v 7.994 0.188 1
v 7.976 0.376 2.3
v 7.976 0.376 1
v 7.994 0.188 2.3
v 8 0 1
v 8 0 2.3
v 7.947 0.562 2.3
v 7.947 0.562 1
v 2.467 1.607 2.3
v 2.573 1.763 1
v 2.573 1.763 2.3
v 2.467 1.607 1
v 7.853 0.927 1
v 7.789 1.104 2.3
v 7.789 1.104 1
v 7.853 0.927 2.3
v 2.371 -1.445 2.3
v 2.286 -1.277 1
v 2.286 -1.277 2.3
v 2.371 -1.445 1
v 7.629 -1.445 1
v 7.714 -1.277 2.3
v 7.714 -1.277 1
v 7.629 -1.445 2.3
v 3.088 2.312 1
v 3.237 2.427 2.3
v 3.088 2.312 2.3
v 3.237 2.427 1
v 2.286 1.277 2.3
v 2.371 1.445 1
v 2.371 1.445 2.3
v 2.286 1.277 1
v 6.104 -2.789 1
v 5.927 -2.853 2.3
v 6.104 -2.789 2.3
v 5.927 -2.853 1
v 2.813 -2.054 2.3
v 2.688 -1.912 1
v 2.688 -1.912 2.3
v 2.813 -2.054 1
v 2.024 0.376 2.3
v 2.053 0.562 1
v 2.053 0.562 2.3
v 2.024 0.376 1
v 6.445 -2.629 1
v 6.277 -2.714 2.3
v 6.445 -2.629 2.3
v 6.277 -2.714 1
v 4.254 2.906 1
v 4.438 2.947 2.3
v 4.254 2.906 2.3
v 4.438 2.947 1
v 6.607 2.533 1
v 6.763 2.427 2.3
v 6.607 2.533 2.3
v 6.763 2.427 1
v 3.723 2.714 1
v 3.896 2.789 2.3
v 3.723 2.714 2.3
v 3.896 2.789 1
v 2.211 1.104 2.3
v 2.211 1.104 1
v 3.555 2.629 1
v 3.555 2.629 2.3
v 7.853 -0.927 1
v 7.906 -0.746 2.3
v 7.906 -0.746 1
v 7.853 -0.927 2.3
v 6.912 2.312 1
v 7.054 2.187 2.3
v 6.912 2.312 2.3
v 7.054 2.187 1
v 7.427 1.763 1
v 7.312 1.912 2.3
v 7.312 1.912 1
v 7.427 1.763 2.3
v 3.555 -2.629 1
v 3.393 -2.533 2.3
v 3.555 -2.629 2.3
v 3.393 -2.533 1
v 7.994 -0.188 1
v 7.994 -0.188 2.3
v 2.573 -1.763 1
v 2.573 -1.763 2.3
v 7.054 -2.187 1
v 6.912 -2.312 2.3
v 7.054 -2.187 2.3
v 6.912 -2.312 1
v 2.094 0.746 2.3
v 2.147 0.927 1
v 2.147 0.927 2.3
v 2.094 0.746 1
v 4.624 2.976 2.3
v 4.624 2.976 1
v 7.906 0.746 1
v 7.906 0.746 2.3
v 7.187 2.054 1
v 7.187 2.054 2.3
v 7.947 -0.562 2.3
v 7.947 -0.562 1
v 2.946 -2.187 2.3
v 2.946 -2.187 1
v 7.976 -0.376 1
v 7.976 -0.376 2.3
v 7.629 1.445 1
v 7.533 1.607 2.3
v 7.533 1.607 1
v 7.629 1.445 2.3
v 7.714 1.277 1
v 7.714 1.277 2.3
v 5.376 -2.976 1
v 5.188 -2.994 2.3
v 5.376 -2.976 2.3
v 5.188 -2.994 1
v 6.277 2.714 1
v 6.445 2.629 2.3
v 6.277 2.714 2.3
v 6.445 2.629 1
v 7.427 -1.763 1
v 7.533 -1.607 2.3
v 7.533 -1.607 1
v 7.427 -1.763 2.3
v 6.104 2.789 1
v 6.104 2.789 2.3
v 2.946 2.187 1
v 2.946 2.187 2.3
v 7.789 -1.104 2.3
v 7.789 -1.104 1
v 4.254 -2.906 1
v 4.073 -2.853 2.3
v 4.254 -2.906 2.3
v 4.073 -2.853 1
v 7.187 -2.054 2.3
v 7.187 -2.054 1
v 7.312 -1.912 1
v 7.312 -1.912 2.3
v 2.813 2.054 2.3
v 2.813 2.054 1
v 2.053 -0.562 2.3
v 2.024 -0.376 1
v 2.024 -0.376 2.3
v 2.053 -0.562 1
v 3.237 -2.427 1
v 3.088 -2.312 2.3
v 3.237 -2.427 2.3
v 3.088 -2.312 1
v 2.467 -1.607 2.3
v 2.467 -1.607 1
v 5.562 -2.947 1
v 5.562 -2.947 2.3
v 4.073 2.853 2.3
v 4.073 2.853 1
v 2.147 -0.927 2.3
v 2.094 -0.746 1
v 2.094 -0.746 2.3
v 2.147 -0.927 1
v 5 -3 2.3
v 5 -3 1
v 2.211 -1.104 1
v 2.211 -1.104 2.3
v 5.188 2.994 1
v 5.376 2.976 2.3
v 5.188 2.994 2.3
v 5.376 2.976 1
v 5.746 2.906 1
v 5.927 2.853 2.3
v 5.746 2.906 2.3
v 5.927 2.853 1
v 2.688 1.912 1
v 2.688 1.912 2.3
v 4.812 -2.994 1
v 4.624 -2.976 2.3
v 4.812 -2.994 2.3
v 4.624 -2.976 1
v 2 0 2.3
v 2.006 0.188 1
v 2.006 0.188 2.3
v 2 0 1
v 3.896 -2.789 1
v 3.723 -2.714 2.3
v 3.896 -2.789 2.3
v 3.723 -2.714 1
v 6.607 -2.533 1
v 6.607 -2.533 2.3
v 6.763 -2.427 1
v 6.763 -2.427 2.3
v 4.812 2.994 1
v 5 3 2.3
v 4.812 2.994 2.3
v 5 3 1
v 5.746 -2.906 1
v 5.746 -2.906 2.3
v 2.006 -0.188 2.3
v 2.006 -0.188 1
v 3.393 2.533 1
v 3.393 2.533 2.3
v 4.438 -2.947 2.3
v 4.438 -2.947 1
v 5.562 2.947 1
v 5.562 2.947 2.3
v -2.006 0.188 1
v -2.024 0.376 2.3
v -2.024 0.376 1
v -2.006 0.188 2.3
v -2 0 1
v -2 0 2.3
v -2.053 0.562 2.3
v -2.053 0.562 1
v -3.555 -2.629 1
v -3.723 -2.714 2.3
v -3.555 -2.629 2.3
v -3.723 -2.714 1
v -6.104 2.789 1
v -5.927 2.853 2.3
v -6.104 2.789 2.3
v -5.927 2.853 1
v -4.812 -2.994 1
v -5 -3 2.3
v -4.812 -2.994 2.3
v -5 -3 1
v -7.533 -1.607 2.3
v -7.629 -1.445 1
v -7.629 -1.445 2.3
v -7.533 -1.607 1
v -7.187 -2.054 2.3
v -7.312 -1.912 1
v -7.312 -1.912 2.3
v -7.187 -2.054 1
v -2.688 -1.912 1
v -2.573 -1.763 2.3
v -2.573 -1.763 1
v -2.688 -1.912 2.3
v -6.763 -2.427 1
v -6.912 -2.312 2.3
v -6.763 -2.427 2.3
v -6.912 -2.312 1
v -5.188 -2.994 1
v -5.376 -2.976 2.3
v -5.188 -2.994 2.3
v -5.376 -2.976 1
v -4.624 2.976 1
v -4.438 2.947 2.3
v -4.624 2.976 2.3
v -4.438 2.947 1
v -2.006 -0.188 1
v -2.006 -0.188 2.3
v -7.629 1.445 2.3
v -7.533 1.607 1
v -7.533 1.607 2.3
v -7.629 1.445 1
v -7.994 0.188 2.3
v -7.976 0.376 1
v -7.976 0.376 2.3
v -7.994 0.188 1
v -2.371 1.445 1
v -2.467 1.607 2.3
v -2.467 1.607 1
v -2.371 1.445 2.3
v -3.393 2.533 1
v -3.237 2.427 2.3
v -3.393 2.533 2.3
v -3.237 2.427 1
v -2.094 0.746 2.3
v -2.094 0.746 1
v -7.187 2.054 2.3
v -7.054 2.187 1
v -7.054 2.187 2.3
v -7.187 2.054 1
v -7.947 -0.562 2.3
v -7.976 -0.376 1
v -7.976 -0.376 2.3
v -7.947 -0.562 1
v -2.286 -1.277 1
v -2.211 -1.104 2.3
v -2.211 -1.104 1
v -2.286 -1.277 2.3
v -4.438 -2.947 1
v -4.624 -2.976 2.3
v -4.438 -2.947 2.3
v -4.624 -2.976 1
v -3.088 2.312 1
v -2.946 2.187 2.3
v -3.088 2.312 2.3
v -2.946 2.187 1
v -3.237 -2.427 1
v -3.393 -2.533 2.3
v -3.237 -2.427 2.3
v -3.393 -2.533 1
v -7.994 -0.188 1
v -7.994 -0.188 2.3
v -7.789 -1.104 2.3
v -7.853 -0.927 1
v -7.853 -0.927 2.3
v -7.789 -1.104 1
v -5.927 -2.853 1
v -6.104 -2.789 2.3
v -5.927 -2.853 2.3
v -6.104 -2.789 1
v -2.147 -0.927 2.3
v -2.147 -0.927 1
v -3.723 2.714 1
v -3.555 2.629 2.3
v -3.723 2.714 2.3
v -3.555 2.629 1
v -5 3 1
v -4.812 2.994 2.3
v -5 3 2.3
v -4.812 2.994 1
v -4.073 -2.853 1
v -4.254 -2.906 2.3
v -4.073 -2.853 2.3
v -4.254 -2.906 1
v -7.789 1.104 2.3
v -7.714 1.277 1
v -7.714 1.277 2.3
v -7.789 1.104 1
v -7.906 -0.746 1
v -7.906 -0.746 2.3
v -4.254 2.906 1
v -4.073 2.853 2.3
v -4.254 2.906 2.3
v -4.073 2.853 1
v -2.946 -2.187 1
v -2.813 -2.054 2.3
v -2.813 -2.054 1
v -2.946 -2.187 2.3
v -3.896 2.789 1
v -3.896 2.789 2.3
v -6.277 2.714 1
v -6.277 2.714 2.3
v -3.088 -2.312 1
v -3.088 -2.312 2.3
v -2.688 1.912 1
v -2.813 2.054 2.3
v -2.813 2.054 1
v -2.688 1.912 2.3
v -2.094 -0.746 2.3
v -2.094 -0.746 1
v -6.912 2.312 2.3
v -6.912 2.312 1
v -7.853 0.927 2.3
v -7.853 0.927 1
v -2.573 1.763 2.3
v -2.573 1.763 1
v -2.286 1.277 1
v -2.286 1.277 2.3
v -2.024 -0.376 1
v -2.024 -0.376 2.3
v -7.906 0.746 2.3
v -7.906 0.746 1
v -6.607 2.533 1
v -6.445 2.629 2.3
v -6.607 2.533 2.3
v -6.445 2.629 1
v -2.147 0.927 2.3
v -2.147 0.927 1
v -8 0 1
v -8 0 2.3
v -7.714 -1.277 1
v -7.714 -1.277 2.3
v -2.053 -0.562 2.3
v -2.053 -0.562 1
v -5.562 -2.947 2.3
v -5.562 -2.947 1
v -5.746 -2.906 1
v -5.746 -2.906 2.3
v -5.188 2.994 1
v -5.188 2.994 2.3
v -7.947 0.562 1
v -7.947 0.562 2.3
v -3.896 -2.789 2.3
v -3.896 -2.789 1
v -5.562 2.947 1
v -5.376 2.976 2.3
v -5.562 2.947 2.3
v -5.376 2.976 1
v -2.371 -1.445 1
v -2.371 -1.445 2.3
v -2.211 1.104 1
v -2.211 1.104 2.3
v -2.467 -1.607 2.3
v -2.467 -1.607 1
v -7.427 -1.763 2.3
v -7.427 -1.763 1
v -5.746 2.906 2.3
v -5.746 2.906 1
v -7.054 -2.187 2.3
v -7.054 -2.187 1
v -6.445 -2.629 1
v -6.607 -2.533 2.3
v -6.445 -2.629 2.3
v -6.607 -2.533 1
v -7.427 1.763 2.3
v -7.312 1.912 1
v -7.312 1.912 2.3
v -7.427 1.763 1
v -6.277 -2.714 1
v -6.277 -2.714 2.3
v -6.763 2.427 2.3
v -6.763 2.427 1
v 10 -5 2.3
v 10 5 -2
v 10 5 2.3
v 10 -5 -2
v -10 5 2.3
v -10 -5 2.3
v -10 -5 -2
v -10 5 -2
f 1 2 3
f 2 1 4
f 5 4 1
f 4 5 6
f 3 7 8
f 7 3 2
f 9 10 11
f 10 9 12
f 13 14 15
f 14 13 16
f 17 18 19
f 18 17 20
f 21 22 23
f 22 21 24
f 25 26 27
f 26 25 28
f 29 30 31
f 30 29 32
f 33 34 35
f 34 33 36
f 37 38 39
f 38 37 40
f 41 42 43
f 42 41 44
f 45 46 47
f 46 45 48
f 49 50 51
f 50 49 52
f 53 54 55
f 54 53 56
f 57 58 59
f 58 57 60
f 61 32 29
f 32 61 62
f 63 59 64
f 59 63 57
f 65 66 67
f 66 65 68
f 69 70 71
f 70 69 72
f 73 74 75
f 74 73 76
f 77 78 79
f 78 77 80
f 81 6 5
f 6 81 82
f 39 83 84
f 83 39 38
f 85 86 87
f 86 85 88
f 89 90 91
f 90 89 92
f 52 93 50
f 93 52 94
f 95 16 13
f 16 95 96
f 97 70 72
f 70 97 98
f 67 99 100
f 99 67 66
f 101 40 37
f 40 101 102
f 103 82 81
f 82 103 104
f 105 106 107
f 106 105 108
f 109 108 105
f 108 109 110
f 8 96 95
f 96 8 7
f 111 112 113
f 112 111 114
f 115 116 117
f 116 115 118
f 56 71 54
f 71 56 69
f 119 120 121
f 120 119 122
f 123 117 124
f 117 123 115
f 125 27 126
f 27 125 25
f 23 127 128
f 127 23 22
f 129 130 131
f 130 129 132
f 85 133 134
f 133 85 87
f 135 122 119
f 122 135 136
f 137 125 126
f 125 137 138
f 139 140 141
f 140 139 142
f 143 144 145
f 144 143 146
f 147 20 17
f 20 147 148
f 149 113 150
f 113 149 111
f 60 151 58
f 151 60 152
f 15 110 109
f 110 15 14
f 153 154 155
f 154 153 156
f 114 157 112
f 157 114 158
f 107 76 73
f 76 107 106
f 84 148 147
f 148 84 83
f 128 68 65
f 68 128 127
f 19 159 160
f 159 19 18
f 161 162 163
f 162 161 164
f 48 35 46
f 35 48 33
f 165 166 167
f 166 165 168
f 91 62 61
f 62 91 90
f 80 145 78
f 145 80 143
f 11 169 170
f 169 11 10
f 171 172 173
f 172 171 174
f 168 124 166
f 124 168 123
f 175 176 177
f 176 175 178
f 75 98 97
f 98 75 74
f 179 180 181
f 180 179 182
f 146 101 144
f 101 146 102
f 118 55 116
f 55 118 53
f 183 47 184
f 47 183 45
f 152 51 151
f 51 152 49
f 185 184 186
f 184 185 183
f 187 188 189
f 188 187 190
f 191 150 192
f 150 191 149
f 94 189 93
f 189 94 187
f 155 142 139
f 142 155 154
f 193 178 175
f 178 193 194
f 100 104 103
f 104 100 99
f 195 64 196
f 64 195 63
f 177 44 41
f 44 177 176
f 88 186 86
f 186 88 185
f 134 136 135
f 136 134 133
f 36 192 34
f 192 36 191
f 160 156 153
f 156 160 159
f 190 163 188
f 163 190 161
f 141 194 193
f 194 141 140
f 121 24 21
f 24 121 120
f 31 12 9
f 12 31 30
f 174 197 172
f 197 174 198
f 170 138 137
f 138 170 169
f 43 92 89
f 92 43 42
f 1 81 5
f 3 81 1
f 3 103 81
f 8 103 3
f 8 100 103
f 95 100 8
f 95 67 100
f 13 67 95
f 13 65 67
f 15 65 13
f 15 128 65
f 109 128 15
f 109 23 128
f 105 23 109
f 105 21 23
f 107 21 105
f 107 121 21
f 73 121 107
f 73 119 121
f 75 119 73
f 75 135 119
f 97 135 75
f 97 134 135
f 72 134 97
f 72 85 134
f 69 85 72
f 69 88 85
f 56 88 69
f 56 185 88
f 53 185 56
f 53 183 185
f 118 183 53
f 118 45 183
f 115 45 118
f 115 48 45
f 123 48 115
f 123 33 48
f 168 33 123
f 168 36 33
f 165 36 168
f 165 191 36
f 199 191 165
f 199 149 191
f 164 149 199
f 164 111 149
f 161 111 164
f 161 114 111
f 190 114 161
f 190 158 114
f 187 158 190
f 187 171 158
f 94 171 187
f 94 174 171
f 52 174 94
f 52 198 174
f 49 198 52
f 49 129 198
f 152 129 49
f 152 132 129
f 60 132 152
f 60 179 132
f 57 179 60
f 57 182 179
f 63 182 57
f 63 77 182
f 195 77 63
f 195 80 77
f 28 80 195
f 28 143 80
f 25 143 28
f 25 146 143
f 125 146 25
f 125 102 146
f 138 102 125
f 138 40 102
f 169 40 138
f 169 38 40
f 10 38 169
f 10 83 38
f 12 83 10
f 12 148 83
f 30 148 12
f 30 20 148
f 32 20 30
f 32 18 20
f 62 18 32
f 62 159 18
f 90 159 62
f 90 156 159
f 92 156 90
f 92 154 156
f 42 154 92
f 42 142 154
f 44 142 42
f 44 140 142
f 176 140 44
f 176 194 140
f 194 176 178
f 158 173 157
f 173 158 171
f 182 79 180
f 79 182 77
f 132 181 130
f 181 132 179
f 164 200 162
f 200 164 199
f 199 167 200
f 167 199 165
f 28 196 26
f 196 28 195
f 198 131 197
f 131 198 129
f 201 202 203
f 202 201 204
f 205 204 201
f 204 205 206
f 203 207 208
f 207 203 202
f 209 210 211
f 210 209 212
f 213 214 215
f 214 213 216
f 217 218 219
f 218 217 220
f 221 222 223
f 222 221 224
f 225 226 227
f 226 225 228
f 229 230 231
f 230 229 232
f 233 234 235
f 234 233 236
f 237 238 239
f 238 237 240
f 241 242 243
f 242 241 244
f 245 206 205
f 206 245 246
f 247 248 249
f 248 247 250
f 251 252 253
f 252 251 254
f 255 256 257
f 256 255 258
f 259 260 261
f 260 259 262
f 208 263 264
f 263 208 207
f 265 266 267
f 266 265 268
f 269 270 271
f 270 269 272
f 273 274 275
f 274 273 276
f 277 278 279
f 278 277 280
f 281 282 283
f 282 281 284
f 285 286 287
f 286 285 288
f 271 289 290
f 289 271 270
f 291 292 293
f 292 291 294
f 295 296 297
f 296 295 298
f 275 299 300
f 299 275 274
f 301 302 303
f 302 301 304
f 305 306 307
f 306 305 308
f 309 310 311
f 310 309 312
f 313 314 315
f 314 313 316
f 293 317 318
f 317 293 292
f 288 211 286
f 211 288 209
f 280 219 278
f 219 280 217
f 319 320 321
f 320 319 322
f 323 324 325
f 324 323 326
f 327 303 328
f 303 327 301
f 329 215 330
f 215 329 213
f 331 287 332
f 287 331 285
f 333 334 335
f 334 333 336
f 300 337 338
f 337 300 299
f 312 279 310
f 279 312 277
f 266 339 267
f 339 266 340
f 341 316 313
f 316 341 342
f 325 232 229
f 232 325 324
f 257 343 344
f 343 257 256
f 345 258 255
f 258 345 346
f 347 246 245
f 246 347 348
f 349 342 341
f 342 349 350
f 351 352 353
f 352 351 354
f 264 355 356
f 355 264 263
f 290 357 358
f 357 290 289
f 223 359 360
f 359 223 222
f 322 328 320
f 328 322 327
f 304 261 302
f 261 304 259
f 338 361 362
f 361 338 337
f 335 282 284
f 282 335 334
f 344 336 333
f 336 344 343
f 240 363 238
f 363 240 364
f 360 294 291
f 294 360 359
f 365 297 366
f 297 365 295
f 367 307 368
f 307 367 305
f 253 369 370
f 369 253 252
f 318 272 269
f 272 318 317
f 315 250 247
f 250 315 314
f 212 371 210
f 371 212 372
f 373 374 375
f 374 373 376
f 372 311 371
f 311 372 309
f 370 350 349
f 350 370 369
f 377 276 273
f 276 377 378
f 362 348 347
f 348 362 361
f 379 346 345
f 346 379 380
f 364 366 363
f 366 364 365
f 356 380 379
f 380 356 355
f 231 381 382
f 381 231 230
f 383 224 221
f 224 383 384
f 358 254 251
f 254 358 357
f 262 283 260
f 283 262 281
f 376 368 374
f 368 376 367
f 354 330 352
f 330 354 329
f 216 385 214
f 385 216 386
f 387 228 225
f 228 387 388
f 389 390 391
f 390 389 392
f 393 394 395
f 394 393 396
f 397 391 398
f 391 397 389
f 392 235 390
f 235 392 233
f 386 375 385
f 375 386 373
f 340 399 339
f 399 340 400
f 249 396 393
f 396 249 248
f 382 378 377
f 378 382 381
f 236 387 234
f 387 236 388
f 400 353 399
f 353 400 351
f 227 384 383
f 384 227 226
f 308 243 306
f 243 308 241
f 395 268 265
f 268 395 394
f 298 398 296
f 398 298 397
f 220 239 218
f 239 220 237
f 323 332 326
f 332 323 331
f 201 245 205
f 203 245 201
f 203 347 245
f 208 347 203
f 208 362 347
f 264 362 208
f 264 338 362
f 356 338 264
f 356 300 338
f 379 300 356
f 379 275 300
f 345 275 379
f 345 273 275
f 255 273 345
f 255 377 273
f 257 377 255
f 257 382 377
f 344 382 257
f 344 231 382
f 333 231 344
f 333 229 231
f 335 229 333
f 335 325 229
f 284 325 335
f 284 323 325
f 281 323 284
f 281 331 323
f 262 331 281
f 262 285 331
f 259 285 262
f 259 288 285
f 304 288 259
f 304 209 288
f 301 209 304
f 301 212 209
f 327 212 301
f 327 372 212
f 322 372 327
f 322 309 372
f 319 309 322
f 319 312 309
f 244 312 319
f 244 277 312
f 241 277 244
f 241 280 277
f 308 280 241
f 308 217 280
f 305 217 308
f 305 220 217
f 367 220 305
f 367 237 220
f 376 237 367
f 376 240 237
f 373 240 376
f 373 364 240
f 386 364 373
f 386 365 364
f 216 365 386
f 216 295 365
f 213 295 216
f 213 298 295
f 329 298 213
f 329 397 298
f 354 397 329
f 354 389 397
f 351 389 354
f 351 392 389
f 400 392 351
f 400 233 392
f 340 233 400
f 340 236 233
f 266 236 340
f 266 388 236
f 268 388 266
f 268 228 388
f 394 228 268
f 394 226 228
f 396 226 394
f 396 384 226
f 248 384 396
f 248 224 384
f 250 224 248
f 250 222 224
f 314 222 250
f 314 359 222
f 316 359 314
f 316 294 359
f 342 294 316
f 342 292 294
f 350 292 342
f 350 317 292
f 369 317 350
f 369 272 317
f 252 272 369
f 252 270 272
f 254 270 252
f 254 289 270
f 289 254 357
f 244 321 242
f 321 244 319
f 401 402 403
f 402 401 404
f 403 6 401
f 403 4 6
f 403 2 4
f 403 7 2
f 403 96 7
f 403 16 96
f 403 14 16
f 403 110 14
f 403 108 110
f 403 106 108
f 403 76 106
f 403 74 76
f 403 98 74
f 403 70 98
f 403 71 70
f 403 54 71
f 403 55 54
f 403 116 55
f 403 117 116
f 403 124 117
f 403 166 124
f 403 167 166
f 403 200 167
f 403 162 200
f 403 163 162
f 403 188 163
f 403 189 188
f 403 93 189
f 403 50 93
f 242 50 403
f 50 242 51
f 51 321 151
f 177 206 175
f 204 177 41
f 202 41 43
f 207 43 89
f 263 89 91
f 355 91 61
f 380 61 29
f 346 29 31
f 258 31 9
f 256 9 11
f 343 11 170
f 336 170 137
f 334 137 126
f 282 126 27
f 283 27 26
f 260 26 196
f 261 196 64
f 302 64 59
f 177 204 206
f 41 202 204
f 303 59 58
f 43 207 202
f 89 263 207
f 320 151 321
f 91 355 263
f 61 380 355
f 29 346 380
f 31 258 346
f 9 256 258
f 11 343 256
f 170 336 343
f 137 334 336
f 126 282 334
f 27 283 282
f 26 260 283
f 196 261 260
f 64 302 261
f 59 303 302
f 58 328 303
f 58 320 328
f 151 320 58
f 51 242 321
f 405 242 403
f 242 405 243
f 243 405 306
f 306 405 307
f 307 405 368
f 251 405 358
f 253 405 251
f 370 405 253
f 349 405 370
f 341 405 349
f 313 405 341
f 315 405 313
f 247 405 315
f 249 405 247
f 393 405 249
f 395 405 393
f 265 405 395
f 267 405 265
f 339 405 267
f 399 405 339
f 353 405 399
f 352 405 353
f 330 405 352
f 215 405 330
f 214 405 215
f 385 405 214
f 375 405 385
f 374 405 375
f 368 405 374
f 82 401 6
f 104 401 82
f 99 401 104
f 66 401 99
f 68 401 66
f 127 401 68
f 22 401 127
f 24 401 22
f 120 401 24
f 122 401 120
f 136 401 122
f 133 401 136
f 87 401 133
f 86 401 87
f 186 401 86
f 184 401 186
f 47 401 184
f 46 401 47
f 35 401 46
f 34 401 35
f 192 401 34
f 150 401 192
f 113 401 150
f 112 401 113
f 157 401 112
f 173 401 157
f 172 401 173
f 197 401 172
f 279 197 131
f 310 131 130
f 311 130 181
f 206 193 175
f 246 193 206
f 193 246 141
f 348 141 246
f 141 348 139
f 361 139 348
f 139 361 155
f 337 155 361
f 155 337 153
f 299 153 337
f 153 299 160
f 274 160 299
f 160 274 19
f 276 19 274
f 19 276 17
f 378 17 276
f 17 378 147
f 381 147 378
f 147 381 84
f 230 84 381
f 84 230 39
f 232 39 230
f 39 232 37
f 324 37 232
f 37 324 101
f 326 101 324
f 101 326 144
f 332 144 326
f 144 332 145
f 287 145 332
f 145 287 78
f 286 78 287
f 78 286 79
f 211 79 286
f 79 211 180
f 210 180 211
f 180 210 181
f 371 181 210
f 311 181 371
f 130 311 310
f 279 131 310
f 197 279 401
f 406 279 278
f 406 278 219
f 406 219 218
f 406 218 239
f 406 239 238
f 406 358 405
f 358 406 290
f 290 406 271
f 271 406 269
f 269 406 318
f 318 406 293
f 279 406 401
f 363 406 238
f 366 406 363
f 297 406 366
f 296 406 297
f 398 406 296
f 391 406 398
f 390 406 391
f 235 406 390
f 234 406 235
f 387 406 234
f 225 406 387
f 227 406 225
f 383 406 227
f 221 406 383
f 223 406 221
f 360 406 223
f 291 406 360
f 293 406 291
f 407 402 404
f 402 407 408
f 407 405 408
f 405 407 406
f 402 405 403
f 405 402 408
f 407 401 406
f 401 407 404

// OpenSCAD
difference(){
	union(){ 

        translate([-10,-5,-2]){
          cube([20,10,4.3], center=false);
        }                

	}
	union() {


        translate([0+5,0,1]){
            rotate([0,0,0]){
                cylinder(h=5, r=3, $fn=100, center=false);
            }   
        }
        translate([0-5,0,1]){
            rotate([0,0,0]){
                cylinder(h=5, r=3, $fn=100, center=false);
            }   
        }

	}
}
